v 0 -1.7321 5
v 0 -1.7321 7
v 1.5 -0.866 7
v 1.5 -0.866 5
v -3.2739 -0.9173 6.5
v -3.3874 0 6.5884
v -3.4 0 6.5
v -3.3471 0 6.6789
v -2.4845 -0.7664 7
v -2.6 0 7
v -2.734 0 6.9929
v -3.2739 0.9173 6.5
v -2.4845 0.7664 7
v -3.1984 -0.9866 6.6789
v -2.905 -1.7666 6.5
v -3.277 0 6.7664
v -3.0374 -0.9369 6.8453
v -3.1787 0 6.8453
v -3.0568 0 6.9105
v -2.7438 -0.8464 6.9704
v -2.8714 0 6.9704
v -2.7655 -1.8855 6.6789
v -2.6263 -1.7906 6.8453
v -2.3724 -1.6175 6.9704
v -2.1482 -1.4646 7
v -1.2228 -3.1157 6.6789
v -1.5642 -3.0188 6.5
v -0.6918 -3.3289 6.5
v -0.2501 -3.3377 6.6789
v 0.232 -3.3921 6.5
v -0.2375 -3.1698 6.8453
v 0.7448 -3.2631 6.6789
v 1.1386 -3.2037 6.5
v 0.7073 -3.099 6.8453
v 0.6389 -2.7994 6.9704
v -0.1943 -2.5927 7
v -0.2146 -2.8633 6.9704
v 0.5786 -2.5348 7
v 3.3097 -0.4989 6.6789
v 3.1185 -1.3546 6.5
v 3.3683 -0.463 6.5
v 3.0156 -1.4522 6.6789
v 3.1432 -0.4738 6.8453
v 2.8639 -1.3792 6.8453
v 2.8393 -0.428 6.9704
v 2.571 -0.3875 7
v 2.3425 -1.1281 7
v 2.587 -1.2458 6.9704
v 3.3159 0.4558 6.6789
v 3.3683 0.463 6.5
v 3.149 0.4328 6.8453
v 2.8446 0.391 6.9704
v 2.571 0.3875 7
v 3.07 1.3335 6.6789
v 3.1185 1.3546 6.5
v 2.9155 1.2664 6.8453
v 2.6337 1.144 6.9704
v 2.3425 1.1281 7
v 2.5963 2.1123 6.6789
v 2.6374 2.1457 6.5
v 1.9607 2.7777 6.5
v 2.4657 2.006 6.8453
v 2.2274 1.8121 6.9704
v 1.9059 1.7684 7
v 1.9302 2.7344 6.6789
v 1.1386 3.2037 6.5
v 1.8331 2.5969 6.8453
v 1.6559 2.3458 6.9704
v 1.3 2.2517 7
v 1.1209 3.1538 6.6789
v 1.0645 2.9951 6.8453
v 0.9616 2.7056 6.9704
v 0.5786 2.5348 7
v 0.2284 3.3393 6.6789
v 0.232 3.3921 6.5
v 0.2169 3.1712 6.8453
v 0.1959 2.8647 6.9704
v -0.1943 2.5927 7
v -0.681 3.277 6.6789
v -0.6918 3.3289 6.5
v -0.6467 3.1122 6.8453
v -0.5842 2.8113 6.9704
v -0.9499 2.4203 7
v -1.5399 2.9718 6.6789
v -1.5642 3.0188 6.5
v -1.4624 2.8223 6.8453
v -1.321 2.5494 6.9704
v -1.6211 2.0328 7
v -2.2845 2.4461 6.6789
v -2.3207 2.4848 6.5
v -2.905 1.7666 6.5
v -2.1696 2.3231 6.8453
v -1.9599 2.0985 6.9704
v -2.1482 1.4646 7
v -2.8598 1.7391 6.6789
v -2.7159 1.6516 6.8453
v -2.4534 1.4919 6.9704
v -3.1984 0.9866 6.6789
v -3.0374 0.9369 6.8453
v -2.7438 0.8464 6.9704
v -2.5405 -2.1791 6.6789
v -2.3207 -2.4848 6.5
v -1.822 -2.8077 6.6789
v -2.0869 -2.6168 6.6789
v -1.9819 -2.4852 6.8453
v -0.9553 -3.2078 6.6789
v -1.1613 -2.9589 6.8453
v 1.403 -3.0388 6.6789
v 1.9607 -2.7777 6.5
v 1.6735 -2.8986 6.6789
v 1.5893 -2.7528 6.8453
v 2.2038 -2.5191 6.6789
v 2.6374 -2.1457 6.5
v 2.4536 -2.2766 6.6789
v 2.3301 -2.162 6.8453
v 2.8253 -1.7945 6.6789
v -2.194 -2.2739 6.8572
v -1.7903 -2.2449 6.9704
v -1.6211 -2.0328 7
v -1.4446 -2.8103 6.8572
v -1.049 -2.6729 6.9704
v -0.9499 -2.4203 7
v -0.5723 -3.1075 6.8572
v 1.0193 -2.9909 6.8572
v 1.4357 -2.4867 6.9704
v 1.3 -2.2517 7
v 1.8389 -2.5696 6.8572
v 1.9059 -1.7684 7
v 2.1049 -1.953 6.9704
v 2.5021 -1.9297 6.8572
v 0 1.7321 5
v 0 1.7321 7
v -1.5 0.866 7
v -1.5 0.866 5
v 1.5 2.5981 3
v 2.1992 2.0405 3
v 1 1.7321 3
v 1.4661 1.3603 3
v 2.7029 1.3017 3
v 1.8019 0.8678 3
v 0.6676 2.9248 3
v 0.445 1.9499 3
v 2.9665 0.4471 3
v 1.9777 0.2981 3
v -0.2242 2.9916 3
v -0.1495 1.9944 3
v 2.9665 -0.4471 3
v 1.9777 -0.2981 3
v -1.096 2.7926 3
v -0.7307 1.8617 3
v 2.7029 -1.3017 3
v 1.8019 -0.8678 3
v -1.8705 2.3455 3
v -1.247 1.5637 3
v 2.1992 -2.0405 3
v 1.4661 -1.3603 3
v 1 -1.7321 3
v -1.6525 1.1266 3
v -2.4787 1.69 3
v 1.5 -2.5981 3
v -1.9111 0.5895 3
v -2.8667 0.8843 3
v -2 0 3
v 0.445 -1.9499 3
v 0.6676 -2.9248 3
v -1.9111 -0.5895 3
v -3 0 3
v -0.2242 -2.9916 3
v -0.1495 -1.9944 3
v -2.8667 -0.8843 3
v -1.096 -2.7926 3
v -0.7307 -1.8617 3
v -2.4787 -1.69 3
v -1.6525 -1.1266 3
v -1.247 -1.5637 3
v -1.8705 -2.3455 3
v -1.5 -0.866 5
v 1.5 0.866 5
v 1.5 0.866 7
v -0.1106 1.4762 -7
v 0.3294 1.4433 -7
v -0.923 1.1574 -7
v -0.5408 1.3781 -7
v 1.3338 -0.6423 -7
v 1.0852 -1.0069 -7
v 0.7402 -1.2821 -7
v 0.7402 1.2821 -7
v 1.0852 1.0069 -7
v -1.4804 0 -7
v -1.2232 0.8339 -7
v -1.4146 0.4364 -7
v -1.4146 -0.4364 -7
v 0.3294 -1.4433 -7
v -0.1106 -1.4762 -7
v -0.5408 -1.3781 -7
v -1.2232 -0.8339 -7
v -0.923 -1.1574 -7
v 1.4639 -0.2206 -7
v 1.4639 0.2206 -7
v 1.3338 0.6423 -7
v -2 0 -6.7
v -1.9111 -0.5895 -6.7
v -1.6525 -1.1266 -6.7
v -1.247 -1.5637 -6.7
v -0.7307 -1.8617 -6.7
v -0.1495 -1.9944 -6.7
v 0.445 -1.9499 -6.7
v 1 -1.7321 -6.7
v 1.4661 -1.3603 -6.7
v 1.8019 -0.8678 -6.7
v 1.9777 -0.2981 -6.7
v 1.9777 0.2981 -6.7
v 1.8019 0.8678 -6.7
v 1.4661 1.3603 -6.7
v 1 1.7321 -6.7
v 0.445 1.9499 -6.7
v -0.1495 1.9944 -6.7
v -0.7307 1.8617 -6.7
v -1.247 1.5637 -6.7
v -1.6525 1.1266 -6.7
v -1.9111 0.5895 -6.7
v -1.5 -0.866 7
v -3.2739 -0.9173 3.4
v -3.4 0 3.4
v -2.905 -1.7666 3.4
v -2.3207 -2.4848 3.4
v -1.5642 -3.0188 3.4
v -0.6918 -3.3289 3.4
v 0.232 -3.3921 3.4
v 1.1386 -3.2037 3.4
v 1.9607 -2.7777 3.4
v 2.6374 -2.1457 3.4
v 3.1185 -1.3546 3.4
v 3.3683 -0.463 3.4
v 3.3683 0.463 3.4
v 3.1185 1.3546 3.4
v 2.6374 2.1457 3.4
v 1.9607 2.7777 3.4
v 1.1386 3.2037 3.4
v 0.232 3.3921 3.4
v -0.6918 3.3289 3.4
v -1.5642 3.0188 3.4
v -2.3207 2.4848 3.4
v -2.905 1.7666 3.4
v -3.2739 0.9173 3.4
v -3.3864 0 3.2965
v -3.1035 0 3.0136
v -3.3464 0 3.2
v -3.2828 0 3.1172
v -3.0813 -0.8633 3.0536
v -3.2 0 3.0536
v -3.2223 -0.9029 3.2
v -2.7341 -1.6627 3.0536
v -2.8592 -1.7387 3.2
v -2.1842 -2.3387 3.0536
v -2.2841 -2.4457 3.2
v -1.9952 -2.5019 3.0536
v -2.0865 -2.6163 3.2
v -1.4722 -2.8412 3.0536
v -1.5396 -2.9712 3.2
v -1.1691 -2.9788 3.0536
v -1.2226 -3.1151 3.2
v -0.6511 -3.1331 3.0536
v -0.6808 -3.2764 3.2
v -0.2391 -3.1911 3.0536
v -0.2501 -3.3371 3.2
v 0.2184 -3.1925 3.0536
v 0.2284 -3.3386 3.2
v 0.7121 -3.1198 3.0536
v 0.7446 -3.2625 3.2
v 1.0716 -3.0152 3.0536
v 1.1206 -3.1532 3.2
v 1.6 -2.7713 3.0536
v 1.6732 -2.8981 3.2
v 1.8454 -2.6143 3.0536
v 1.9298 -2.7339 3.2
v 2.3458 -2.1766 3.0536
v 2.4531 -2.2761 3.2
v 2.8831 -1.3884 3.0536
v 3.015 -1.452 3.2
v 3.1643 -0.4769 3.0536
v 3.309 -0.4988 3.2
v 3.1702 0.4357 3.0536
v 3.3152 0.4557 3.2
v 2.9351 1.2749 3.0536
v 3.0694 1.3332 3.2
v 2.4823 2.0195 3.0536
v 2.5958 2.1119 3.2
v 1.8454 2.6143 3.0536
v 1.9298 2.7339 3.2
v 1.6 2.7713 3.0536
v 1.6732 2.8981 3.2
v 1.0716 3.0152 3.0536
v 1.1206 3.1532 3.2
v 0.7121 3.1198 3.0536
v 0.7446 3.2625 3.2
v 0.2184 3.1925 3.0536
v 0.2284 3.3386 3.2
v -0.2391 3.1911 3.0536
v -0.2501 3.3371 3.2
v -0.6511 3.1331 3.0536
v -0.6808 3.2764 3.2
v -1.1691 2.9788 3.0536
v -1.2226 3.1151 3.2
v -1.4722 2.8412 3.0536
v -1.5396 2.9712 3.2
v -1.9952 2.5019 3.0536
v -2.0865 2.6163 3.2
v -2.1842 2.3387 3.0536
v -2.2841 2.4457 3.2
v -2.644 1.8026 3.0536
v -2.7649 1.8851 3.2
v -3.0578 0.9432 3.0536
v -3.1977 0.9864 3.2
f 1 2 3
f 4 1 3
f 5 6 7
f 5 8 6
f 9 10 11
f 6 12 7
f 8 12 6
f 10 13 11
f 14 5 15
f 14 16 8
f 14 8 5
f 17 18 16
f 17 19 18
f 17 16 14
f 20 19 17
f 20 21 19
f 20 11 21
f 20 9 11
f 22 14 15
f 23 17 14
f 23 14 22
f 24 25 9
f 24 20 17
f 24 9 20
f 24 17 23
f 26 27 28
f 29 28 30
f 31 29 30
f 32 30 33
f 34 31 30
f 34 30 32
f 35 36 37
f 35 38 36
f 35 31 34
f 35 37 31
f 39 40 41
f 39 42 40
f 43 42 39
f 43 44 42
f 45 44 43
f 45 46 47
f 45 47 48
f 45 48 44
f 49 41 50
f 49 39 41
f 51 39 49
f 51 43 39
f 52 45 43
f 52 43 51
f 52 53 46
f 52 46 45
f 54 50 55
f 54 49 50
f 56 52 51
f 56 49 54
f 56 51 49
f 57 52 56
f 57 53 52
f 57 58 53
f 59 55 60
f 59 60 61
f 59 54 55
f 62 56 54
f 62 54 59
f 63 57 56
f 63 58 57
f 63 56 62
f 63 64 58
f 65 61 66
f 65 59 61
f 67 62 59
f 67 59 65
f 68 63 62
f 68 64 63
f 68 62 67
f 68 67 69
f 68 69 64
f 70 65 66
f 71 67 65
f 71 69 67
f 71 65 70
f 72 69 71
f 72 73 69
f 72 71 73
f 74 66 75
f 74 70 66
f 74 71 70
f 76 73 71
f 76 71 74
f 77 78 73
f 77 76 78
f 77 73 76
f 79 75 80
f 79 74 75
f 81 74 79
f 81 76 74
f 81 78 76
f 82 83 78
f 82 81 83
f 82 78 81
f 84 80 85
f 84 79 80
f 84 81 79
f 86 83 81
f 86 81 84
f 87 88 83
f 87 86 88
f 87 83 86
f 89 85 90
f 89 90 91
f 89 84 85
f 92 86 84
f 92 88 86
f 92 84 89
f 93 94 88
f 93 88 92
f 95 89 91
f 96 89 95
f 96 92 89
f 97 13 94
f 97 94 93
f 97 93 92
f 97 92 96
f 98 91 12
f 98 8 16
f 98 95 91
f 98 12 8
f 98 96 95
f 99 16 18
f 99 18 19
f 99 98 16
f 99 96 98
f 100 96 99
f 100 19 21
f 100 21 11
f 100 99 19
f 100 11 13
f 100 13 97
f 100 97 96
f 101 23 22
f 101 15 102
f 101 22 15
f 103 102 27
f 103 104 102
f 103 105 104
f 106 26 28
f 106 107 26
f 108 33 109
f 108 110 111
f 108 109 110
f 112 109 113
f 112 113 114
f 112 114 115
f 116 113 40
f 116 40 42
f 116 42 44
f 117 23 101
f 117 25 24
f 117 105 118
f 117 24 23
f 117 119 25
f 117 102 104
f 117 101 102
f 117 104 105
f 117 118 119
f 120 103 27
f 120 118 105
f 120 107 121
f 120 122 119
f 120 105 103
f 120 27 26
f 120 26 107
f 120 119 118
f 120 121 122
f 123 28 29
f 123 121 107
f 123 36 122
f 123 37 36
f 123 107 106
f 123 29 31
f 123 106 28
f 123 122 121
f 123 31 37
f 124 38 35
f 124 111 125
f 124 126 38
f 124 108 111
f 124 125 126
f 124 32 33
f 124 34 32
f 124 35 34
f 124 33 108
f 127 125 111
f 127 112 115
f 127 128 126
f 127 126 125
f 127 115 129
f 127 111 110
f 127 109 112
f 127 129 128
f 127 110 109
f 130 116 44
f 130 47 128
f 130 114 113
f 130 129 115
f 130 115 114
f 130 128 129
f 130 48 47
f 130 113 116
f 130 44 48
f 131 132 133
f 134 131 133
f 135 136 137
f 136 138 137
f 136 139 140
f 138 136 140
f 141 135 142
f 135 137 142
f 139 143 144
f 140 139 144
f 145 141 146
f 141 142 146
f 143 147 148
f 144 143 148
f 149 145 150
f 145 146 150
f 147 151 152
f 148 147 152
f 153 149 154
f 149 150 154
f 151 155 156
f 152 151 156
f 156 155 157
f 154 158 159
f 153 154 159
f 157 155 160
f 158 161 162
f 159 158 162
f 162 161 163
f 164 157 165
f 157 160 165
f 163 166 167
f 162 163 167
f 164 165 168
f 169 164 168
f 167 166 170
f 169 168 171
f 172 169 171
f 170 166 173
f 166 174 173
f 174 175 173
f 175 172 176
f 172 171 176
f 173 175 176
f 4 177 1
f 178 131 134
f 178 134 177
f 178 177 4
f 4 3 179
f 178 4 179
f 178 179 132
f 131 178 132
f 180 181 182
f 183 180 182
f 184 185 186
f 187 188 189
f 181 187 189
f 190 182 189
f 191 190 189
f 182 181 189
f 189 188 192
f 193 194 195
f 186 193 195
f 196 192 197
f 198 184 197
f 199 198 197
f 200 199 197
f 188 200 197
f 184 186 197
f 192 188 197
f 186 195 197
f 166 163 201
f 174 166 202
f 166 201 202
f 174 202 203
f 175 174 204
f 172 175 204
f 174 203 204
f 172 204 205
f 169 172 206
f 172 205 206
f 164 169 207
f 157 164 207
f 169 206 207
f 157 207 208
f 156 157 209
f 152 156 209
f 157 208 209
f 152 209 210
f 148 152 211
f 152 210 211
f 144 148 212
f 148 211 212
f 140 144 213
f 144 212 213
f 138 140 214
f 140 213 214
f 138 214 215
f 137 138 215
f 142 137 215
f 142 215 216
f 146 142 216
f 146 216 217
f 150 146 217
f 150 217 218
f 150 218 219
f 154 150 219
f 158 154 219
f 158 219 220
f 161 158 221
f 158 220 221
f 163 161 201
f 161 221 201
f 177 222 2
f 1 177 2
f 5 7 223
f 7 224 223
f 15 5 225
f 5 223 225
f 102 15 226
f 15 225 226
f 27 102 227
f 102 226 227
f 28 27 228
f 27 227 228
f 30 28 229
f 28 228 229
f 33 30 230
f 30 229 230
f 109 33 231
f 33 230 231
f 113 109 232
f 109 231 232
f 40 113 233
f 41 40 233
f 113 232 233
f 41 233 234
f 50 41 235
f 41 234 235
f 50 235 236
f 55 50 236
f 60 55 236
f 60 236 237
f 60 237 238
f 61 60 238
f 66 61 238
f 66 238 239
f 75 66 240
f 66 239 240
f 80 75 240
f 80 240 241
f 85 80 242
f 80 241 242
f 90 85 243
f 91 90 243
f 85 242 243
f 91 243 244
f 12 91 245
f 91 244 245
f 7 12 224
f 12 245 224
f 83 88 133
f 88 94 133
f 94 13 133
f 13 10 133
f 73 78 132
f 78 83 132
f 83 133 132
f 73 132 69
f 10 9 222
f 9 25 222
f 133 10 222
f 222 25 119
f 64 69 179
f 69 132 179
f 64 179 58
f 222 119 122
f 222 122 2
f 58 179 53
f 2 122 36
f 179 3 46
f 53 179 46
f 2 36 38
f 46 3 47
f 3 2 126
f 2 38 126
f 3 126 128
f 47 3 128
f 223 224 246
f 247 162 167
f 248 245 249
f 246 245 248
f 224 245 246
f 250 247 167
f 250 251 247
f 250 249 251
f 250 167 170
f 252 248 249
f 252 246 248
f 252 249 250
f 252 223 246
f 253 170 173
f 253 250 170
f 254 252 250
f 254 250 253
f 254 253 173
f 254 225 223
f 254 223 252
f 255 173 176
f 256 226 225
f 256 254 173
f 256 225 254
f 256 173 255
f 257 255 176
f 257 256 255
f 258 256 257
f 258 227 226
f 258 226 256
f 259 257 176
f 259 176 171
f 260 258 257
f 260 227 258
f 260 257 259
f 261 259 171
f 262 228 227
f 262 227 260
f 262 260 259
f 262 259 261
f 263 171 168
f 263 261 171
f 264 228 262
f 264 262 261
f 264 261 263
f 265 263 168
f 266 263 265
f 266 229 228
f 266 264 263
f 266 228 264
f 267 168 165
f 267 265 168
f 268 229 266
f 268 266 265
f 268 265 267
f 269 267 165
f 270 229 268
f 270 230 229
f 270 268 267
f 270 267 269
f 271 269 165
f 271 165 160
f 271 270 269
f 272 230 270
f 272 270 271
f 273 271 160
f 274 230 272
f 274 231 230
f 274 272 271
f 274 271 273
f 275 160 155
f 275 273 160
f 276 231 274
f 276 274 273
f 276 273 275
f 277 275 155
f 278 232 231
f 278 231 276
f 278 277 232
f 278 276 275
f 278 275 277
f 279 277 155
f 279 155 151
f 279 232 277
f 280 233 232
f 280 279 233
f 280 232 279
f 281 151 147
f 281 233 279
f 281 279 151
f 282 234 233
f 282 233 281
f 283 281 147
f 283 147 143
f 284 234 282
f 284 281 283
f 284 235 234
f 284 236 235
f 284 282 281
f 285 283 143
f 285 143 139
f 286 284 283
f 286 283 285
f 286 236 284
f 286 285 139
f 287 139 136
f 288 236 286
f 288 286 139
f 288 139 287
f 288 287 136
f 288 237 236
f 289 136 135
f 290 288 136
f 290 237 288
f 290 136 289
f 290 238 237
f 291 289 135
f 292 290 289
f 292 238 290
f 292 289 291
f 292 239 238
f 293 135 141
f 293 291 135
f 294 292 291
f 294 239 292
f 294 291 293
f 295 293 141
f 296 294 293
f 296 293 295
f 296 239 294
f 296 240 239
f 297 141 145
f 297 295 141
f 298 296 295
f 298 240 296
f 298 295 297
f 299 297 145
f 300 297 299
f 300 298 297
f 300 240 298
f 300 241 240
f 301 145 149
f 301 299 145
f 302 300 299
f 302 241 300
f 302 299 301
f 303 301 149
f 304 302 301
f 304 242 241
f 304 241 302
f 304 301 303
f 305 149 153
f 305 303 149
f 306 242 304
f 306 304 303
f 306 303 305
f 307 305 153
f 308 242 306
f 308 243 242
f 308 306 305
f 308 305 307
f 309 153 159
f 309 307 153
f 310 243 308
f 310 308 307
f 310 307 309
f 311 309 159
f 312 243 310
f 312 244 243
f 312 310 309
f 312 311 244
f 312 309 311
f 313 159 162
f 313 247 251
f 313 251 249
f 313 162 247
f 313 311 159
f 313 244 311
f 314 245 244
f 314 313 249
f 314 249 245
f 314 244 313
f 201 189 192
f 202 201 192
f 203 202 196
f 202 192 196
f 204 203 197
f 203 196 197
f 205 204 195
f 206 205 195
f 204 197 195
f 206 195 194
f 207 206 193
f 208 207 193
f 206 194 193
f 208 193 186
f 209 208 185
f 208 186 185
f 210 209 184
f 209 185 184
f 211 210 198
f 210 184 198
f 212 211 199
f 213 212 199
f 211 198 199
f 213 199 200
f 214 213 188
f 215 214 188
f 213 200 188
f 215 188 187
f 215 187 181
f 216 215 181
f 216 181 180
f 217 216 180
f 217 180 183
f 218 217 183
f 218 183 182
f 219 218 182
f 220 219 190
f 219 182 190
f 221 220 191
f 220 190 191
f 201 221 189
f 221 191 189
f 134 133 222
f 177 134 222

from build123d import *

# Parameters (mm, degrees)
CHAMFER_1_SIZE      = 0.3
CHAMFER_1_SIZE2     = 0.519615242
FILLET_1_R          = 0.4
FILLET_2_SIZE       = 0.5
FILLET_2_SIZE_2     = 0.8
CUT_EXTRUDE_1_DEPTH = 2


with BuildPart() as part:
    # 草图2 → 旋转1 (revolve)
    with BuildSketch(Plane(origin=(0, 0, 0), x_dir=(0, 0, -1), z_dir=(1, 0, 0)), mode=Mode.PRIVATE) as revolve_1_sk:
        Polygon((-7, 0), (-7, 3.4), (-3, 3.4), (-3, 2), (7, 2), (7, 0), align=None)
    revolve(revolve_1_sk.sketch.rotate(Axis((0, 0, -7), (0, 0, 1)), 90), axis=Axis((0, 0, -7), (0, 0, 1)))

    # 倒角1
    chamfer_1_edges = [part.edges().sort_by_distance(p)[0] for p in [
        (2, 0, -7),
    ]]
    chamfer_1_side = [part.faces().sort_by_distance(p)[0] for p in [
        (2, 0, -2),
    ]]
    chamfer(chamfer_1_edges, length=CHAMFER_1_SIZE, length2=CHAMFER_1_SIZE2, reference=chamfer_1_side[0])

    # 圆角1
    fillet_1_edges = [part.edges().sort_by_distance(p)[0] for p in [
        (3.4, 0, 3),
    ]]
    fillet(fillet_1_edges, radius=FILLET_1_R)

    # 圆角2
    # an asymmetric fillet: 0.8, 0.5 mm, written as the material it takes off along each edge
    with BuildSketch(Plane(origin=(0, 0, 7), x_dir=(-1, 0, 0), z_dir=(0, 1, 0))) as fillet_2_piece_1:
        with BuildLine():
            Bezier((3.4, -FILLET_2_SIZE), (3.4, 0), (3.4 - FILLET_2_SIZE_2, 0), weights=[1, 0.707106781, 1])
            Line((3.4 - FILLET_2_SIZE_2, 0), (3.4, 0))
            Line((3.4, 0), (3.4, -FILLET_2_SIZE))
        make_face()
    revolve(axis=Axis((0, 0, 7), (0, 0, 1)), mode=Mode.SUBTRACT)

    # 草图3 → 切除-拉伸1 (cut)
    with BuildSketch(Plane.XY.offset(7)):
        Polygon((0, 1.732050808), (-1.5, 0.866025404), (-1.5, -0.866025404), (0, -1.732050808), (1.5, -0.866025404), (1.5, 0.866025404), align=None)
    extrude(amount=-CUT_EXTRUDE_1_DEPTH, mode=Mode.SUBTRACT)


solid = part.part
